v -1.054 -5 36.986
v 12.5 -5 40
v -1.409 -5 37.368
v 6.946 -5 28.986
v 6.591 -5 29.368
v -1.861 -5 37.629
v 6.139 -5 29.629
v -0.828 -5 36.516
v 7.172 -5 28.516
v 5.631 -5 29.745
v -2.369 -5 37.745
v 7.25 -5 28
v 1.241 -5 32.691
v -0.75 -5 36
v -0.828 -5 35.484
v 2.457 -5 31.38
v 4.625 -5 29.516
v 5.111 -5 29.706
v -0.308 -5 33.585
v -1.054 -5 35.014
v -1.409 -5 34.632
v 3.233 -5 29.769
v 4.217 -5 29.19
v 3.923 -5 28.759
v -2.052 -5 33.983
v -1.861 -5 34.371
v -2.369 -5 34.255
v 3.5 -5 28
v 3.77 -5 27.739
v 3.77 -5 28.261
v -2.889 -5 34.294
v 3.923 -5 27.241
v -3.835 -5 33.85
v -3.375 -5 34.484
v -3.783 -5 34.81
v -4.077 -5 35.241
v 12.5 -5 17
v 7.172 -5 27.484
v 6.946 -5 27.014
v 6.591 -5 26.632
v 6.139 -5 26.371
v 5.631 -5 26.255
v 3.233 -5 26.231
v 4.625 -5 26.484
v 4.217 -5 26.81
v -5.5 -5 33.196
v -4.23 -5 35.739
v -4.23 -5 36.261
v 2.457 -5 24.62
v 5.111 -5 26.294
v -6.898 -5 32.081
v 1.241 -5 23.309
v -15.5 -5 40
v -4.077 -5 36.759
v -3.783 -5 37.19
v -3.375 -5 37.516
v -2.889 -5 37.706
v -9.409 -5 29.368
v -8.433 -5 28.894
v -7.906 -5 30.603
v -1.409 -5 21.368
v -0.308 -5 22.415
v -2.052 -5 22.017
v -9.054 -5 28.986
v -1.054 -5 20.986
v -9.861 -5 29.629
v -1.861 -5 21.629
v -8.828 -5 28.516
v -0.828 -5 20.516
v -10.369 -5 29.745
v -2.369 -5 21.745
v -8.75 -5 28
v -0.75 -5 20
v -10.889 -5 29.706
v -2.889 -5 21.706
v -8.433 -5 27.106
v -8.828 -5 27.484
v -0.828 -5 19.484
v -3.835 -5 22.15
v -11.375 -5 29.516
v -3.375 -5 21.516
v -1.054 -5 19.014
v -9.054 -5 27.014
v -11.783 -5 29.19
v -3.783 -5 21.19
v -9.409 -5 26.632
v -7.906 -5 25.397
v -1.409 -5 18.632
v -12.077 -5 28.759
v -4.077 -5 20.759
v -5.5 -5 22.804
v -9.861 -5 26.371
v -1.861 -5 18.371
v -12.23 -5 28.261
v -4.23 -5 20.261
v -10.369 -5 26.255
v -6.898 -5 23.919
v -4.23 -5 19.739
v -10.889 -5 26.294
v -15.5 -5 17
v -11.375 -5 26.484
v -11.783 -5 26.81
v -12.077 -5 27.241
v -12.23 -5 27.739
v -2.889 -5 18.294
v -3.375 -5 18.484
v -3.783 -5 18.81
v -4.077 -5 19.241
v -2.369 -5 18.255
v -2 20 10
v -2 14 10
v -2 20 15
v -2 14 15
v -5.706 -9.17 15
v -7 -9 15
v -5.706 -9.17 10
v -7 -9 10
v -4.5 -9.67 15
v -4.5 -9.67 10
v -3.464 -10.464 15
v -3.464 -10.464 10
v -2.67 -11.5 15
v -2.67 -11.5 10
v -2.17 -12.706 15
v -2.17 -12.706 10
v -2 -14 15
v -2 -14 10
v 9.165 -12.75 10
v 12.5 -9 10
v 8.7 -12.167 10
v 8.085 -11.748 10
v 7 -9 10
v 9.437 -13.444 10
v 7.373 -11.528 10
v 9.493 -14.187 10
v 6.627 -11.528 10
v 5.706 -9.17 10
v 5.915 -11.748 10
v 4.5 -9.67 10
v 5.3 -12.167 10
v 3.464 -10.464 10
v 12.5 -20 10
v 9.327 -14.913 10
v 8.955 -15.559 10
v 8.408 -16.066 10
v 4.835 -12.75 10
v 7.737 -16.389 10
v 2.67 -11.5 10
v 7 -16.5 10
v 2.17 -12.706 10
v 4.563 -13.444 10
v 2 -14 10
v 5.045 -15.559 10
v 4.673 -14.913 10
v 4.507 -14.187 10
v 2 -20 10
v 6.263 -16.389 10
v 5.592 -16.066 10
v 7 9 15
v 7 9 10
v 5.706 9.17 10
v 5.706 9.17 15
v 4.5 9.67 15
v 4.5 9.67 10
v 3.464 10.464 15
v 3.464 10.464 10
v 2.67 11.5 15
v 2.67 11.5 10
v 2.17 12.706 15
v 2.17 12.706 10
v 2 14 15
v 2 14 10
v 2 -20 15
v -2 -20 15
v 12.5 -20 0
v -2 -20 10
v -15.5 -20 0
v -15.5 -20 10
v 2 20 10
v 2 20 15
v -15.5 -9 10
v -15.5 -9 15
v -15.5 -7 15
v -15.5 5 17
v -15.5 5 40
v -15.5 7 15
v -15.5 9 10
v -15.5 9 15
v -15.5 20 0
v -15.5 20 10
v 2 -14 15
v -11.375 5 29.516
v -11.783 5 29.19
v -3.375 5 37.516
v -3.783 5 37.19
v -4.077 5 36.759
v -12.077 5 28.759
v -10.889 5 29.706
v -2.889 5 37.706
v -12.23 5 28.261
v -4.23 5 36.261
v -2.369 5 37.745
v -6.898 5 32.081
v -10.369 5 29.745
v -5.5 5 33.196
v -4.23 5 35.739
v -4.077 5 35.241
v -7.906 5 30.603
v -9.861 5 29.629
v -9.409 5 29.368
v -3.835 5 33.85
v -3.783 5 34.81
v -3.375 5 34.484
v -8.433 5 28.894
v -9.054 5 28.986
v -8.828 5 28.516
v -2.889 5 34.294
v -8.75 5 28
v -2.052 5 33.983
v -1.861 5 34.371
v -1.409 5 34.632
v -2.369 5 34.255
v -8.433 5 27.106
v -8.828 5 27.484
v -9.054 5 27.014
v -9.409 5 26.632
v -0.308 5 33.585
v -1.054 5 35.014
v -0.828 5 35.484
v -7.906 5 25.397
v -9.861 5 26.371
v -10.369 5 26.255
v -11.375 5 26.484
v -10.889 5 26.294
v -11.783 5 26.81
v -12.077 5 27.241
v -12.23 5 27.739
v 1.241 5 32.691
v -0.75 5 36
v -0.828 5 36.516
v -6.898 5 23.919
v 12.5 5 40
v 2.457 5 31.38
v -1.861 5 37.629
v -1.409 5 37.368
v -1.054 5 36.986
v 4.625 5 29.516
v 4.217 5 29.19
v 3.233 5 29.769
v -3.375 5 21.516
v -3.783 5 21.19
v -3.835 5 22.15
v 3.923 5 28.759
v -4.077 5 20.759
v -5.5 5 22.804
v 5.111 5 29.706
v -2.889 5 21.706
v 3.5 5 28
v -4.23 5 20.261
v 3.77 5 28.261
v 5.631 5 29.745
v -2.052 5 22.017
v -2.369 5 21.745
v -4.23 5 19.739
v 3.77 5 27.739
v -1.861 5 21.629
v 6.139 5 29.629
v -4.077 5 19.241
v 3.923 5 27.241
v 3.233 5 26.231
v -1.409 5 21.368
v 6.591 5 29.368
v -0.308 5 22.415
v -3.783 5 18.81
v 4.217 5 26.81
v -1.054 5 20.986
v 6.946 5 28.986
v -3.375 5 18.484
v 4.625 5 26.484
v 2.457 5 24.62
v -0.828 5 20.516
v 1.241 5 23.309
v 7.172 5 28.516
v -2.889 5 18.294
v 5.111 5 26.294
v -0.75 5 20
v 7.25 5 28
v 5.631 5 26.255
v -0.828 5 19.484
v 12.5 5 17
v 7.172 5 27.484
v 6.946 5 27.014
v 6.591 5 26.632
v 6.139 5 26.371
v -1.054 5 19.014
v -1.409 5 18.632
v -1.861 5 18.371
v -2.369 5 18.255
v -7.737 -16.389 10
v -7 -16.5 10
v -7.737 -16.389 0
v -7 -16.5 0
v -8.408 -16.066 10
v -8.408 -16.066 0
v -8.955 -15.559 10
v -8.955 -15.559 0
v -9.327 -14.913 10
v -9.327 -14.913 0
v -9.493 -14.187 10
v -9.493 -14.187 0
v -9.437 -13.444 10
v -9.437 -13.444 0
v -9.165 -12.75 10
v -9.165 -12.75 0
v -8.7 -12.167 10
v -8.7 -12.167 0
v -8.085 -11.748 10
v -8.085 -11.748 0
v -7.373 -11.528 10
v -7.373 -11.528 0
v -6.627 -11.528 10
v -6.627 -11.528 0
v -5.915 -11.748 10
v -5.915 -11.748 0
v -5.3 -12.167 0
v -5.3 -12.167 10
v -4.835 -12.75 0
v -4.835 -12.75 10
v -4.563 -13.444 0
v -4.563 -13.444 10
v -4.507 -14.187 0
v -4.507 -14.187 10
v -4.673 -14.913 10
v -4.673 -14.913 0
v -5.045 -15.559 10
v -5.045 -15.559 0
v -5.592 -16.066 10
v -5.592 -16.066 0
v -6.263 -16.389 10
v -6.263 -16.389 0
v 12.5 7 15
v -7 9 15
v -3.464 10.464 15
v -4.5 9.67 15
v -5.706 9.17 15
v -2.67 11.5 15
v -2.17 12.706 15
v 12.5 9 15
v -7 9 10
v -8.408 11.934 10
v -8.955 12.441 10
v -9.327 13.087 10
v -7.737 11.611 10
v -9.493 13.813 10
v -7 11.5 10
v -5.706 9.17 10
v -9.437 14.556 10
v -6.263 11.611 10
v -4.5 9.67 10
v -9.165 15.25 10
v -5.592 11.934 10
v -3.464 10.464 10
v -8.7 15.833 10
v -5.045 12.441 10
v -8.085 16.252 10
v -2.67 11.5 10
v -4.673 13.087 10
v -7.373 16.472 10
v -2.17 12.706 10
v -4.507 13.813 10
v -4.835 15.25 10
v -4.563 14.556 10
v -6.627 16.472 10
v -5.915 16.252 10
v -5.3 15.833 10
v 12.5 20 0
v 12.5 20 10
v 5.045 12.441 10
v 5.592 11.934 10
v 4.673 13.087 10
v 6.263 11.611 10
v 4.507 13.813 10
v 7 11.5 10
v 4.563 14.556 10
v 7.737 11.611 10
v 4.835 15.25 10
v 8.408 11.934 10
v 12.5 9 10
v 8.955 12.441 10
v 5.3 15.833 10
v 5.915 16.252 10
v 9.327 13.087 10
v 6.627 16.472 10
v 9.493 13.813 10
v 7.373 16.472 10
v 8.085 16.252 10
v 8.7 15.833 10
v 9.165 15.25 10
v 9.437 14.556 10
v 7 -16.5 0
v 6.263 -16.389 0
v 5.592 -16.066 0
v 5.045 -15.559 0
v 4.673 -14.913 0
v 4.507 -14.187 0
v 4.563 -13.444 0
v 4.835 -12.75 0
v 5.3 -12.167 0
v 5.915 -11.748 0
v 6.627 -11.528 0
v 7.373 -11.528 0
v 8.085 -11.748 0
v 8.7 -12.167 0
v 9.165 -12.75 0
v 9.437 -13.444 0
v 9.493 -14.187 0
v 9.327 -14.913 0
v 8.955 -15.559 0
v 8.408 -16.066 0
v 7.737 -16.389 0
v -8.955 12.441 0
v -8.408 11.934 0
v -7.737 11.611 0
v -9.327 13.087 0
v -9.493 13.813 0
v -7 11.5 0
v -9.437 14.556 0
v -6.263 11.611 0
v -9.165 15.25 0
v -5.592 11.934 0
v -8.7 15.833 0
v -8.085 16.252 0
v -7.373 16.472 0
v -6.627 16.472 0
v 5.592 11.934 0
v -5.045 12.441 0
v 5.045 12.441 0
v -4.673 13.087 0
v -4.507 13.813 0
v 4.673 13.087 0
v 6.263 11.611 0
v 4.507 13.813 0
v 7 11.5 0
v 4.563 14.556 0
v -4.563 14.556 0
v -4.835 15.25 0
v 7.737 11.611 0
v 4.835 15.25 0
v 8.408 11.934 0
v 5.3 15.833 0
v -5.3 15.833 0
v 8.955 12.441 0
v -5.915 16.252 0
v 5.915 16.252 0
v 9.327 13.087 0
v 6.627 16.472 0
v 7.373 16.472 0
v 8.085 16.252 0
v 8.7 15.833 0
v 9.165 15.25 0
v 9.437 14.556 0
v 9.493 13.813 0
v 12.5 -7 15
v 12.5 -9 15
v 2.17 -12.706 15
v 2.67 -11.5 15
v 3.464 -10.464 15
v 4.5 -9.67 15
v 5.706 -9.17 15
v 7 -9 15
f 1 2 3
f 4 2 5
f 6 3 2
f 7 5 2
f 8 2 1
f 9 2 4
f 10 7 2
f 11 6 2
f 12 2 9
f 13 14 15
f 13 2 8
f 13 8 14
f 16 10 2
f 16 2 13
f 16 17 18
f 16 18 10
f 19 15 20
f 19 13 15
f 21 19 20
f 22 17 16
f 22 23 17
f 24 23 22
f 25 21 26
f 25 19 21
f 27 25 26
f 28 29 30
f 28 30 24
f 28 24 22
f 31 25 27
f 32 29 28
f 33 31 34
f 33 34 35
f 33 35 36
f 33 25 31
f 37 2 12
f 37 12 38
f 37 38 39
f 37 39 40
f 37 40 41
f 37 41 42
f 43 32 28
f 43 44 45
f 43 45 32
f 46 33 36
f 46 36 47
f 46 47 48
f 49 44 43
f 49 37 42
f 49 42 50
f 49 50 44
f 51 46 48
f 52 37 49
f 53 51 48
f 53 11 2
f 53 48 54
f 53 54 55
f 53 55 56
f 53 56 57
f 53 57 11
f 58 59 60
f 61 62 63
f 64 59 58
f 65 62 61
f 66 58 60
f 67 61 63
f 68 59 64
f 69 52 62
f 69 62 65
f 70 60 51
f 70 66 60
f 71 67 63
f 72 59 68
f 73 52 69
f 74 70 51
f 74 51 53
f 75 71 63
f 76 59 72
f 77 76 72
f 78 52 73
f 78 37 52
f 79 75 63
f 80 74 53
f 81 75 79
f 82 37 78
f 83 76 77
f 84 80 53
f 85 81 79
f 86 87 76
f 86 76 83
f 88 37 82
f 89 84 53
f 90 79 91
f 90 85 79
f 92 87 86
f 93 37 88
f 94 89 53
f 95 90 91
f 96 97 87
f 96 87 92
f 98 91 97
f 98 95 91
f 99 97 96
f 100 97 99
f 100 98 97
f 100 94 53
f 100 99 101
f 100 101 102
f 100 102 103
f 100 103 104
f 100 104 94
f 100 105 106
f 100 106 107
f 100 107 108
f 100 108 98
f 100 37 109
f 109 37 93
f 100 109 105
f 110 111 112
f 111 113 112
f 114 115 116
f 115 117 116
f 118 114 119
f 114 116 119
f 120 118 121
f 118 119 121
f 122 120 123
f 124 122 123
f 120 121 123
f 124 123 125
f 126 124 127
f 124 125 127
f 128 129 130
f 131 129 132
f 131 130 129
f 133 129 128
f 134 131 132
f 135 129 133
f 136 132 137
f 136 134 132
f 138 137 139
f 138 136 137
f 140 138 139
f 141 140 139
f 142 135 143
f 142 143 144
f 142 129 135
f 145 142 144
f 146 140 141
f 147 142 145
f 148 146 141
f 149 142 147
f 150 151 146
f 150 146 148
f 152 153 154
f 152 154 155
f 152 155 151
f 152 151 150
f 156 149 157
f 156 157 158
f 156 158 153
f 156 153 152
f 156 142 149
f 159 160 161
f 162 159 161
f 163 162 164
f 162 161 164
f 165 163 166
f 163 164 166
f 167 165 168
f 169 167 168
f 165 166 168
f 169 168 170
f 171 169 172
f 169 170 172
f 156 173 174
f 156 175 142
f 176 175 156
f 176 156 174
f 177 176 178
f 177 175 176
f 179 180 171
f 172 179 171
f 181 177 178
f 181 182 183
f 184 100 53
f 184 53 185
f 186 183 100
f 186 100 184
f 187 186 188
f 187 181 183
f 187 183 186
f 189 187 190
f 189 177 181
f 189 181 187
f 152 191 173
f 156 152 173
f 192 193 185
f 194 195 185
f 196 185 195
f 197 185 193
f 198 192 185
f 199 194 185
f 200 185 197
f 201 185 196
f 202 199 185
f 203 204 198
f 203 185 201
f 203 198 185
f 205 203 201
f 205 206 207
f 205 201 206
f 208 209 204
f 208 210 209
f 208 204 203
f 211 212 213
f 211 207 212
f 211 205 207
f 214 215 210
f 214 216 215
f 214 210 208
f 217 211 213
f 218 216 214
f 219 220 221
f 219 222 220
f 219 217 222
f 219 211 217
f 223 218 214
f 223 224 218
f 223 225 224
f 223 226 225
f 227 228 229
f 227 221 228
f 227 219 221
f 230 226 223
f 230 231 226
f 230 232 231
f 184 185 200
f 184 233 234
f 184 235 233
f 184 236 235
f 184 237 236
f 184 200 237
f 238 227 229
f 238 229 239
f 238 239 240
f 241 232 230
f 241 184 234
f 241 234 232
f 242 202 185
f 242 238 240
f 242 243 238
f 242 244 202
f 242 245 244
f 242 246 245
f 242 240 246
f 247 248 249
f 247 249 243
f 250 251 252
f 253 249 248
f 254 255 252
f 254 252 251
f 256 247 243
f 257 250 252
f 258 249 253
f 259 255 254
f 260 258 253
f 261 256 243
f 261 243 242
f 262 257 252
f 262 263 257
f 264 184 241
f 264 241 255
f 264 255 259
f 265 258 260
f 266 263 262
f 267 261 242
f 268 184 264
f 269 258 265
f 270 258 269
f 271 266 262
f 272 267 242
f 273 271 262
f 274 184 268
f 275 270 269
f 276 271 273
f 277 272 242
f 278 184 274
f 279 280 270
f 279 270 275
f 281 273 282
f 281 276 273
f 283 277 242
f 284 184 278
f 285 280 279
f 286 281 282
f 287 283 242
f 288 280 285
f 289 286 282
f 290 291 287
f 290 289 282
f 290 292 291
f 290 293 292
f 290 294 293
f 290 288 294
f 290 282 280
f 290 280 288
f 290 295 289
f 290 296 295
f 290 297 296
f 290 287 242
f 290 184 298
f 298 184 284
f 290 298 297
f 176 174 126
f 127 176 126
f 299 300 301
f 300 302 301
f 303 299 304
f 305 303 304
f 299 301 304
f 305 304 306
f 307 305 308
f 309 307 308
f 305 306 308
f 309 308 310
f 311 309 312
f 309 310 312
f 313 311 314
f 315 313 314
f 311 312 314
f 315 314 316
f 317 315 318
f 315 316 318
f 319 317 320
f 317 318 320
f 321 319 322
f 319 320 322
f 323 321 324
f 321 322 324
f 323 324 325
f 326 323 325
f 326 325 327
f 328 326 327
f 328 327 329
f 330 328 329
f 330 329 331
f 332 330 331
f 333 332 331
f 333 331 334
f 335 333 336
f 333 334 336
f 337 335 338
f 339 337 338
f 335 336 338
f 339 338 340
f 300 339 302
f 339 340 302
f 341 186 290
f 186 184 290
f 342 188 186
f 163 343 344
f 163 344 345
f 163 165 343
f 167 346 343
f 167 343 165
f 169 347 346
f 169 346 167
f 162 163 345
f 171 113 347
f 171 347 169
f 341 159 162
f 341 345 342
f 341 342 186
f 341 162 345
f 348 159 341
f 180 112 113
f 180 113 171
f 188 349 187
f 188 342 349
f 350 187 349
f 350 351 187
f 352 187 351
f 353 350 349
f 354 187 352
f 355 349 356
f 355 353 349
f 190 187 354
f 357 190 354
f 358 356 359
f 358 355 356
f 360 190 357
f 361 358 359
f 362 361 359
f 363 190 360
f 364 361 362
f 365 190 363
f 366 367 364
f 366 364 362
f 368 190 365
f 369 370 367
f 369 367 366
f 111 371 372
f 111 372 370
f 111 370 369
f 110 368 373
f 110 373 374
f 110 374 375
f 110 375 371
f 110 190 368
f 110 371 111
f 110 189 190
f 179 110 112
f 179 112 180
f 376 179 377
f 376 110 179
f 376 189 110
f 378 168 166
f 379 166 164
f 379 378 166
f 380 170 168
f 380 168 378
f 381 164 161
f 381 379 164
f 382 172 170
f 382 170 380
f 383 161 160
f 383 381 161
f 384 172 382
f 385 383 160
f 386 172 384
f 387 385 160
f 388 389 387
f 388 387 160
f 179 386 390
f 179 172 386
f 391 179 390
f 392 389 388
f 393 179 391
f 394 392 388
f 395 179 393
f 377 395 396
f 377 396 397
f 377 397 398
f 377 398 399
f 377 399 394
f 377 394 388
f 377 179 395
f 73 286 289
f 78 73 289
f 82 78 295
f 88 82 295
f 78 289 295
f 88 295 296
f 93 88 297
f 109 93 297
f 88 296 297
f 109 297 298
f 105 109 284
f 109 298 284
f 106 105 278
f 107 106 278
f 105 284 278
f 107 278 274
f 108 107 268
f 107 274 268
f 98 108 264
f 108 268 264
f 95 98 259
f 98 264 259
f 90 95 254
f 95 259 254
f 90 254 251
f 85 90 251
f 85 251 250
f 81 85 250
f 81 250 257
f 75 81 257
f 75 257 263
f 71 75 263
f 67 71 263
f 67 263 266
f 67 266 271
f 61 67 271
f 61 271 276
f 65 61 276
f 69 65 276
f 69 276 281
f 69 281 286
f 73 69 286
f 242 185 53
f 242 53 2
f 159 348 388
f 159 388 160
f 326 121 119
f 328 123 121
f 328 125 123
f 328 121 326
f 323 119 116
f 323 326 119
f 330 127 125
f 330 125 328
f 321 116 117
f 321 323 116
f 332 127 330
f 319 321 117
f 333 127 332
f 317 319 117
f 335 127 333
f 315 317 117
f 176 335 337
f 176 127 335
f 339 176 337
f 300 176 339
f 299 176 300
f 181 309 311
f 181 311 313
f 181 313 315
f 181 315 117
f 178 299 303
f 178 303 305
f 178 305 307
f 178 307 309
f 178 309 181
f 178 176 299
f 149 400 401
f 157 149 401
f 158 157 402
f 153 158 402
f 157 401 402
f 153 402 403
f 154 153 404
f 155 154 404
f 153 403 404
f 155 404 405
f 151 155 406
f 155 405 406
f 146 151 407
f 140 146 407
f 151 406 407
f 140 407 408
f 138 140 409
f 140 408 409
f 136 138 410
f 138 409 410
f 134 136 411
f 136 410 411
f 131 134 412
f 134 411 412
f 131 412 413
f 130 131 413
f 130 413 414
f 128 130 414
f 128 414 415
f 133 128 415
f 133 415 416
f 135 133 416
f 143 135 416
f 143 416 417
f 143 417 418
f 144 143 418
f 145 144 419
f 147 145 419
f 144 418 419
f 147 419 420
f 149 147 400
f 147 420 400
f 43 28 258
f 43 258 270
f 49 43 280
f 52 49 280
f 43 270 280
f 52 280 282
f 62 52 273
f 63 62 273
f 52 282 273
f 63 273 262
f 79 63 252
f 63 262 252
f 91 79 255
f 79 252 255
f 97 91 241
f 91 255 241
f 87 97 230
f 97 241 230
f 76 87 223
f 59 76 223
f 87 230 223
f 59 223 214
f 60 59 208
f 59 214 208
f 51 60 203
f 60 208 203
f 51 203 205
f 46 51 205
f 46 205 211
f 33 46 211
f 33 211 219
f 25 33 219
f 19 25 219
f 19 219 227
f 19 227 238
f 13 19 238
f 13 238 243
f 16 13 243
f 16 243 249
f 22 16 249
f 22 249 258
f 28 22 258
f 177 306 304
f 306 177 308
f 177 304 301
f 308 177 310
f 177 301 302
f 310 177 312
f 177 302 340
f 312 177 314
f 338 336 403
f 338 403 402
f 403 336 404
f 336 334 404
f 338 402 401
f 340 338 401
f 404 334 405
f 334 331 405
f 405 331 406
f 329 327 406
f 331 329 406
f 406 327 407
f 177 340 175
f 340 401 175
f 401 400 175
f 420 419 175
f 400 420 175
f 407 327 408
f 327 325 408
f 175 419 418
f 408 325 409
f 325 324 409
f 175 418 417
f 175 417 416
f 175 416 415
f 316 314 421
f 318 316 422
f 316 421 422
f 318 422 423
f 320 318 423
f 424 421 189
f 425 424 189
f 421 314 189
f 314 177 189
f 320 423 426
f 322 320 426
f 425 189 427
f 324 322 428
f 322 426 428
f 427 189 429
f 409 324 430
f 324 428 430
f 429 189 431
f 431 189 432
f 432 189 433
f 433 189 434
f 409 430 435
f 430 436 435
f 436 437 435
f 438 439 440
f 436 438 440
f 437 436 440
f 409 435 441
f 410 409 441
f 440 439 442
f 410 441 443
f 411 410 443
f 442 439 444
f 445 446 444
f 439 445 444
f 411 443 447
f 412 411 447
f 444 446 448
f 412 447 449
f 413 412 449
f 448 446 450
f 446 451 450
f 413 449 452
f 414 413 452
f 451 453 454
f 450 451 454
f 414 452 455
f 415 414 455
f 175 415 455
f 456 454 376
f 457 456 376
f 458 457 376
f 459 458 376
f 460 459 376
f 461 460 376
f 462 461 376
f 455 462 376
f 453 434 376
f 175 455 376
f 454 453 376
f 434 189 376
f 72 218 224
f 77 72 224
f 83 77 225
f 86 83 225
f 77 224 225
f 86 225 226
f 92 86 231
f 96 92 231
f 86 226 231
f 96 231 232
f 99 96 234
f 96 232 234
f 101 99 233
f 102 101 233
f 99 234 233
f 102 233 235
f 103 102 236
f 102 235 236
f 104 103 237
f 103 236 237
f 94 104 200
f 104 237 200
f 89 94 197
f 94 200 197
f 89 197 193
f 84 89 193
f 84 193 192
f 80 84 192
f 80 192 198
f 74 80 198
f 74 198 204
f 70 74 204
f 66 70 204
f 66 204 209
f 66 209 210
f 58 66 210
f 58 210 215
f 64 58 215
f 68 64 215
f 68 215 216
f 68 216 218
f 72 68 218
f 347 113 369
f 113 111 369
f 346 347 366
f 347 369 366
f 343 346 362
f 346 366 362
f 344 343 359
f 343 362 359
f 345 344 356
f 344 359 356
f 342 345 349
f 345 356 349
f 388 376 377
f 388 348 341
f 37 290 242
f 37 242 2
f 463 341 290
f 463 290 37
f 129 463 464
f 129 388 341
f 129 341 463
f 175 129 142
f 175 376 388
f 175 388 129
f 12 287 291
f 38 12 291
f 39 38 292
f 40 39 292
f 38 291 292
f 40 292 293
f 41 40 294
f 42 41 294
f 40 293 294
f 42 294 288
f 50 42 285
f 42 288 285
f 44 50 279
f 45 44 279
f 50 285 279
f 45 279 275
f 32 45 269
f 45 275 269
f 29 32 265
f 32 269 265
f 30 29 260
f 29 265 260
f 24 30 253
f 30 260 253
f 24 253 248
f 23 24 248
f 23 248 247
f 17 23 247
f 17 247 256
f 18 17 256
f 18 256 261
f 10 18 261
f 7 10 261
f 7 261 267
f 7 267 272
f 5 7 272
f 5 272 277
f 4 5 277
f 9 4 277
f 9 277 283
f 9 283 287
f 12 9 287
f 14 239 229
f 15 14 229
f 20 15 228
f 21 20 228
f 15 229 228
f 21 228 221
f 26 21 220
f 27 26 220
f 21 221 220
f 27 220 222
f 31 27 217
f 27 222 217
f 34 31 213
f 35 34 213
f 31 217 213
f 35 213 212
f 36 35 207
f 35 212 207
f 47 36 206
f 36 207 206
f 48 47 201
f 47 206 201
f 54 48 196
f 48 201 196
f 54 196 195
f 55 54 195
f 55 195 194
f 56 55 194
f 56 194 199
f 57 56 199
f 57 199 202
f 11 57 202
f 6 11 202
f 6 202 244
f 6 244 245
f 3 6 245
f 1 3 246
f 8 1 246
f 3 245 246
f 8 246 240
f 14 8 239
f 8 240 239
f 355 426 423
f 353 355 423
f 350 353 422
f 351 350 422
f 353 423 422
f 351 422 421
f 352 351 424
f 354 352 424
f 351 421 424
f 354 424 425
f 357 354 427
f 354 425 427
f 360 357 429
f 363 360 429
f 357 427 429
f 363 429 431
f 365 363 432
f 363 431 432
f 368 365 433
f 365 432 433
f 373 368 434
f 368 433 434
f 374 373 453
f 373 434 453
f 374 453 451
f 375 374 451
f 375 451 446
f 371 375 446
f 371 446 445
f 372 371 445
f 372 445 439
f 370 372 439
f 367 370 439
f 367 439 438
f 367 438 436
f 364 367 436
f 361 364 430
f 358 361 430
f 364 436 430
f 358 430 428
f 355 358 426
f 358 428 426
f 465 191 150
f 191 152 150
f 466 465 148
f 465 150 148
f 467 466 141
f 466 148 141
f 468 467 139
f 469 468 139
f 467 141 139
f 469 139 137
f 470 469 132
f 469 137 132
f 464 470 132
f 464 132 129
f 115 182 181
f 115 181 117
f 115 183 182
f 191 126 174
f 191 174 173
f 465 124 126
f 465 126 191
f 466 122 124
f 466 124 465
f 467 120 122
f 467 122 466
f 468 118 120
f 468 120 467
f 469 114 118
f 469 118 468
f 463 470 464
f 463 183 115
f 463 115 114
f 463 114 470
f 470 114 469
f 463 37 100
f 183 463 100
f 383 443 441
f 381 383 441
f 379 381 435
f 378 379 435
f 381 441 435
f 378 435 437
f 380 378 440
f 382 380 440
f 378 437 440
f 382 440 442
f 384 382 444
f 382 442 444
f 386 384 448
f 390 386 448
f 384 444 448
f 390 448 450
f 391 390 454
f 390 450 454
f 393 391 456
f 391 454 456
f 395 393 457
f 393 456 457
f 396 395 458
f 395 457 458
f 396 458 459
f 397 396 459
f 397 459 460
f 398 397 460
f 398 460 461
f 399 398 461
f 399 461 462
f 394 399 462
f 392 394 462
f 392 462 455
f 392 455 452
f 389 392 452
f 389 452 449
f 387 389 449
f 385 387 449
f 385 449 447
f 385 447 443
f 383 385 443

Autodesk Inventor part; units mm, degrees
ref_plane "YZ Plane" through (0, 0, 0) normal (1, 0, 0) x (0, 1, 0)
ref_plane "XZ Plane" through (0, 0, 0) normal (0, 1, 0) x (-1, 0, 0)
ref_plane "XY Plane" through (0, 0, 0) normal (0, 0, 1) x (1, 0, 0)
sketch "Sketch1" plane through (0, 0, 0) normal (0, 0, 1) x (1, 0, 0)
  line L0 (-12.5, 20) -> (12.5, 20)
  line L1 (12.5, 20) -> (12.5, -20)
  line L2 (12.5, -20) -> (-12.5, -20)
  line L3 (-12.5, -20) -> (-12.5, 20)
  point P0 (0, 0)
  point P1 (-12.5, 0)
  point P2 (0, 20)
  dimension "d0" = 40
  dimension "d1" = 25
extrude "Extrusion1" add sketch "Sketch1" along normal blind 15
sketch "Sketch3" plane through (0, 0, 15) normal (0, 0, -1) x (-1, 0, 0)
  line L0 (-12.5, -20) -> (-12.5, 20) projected
  line L1 (-12.5, -20) -> (-12.5, 20) projected
  line L2 (12.5, -20) -> (-12.5, -20) projected
  line L3 (-12.5, 20) -> (12.5, 20) projected
  line L4 (0, 0) -> (0, 4.9357) construction
  point P0 (-7, -14)
  point P1 (-7, 14)
  point P2 (0, -20)
  point P3 (0, 20)
  point P4 (7, -14)
  point P5 (7, 14)
  dimension "d21" = 6
  dimension "d22" = 6
  dimension "d24" = 5.5
hole "Hole1" at (7, -14, 15) at (-7, -14, 15) at (-7, 14, 15) at (7, 14, 15) direction (0, 0, -1) diameter 5 end through all counterbore diameter 10 counterbore depth 5
sketch "Sketch4" plane through (0, 0, 15) normal (0, 0, 1) x (1, 0, 0)
  line L0 (-12.5, 5) -> (12.5, 5)
  line L1 (12.5, 5) -> (12.5, -5)
  line L2 (12.5, -5) -> (-12.5, -5)
  line L3 (-12.5, -5) -> (-12.5, 5)
  line L4 (12.5, -20) -> (12.5, 20) projected
  line L5 (-12.5, 20) -> (-12.5, -20) projected
  point P0 (0, 0)
  point P1 (12.5, 0)
  dimension "d20" = 10
extrude "Extrusion3" add sketch "Sketch4" along normal blind 25
sketch "Sketch5" plane through (-12.5, 5, 15) normal (0, 1, 0) x (1, 0, 0)
  circle A0 centre (10, -13) radius 6
  line L0 (25, -25) -> (0, -25) projected
  line L1 (25, 0) -> (25, -25) projected
  circle A1 centre (10, -5) radius 1.75
  circle A2 centre (2, -13) radius 1.75
  circle A3 centre (10, -21) radius 1.75
  circle A4 centre (18, -13) radius 1.75
  point P0 (12.5, 15)
  dimension "d27" = 12
  dimension "d28" = 12
  dimension "d29" = 15
  dimension "d30" = 3.5
  dimension "d31" = 8
  dimension "d34" = 360
extrude "Extrusion4" cut sketch "Sketch5" against normal through all
sketch "Sketch6" plane through (0, 0, 15) normal (0, 0, 1) x (1, 0, 0)
  line L0 (12.5, 5) -> (12.5, 20) projected
  line L1 (12.5, 9) -> (7, 9)
  circle A0 centre (7, 14) radius 5 projected
  line L2 (2, 20) -> (2, 14)
  line L3 (12.5, 20) -> (-12.5, 20) projected
  point P0 (0, 0)
  point P1 (12.5, 7)
extrude "Extrusion5" cut sketch "Sketch6" against normal up to surface (5 mm away) contours L1 A0 L2 L3 L0
mirror "Mirror1" about plane through (0, 0, 0) normal (1, 0, 0) of "Extrusion5"
mirror "Mirror2" about plane through (0, 0, 0) normal (0, 1, 0) of "Extrusion5", "Mirror1"
move faces "Move1" translate (-3, 0, 0) faces at (-12.5, 3, 3.3333)
chamfer "Chamfer2" distance 2 angle 45 2 edges at (-1.5, 5, 15) (-1.5, -5, 15)
equation "\"d22\" = d21"
properties part number "0008-10-013 Supăort Piulita Axa Z"
